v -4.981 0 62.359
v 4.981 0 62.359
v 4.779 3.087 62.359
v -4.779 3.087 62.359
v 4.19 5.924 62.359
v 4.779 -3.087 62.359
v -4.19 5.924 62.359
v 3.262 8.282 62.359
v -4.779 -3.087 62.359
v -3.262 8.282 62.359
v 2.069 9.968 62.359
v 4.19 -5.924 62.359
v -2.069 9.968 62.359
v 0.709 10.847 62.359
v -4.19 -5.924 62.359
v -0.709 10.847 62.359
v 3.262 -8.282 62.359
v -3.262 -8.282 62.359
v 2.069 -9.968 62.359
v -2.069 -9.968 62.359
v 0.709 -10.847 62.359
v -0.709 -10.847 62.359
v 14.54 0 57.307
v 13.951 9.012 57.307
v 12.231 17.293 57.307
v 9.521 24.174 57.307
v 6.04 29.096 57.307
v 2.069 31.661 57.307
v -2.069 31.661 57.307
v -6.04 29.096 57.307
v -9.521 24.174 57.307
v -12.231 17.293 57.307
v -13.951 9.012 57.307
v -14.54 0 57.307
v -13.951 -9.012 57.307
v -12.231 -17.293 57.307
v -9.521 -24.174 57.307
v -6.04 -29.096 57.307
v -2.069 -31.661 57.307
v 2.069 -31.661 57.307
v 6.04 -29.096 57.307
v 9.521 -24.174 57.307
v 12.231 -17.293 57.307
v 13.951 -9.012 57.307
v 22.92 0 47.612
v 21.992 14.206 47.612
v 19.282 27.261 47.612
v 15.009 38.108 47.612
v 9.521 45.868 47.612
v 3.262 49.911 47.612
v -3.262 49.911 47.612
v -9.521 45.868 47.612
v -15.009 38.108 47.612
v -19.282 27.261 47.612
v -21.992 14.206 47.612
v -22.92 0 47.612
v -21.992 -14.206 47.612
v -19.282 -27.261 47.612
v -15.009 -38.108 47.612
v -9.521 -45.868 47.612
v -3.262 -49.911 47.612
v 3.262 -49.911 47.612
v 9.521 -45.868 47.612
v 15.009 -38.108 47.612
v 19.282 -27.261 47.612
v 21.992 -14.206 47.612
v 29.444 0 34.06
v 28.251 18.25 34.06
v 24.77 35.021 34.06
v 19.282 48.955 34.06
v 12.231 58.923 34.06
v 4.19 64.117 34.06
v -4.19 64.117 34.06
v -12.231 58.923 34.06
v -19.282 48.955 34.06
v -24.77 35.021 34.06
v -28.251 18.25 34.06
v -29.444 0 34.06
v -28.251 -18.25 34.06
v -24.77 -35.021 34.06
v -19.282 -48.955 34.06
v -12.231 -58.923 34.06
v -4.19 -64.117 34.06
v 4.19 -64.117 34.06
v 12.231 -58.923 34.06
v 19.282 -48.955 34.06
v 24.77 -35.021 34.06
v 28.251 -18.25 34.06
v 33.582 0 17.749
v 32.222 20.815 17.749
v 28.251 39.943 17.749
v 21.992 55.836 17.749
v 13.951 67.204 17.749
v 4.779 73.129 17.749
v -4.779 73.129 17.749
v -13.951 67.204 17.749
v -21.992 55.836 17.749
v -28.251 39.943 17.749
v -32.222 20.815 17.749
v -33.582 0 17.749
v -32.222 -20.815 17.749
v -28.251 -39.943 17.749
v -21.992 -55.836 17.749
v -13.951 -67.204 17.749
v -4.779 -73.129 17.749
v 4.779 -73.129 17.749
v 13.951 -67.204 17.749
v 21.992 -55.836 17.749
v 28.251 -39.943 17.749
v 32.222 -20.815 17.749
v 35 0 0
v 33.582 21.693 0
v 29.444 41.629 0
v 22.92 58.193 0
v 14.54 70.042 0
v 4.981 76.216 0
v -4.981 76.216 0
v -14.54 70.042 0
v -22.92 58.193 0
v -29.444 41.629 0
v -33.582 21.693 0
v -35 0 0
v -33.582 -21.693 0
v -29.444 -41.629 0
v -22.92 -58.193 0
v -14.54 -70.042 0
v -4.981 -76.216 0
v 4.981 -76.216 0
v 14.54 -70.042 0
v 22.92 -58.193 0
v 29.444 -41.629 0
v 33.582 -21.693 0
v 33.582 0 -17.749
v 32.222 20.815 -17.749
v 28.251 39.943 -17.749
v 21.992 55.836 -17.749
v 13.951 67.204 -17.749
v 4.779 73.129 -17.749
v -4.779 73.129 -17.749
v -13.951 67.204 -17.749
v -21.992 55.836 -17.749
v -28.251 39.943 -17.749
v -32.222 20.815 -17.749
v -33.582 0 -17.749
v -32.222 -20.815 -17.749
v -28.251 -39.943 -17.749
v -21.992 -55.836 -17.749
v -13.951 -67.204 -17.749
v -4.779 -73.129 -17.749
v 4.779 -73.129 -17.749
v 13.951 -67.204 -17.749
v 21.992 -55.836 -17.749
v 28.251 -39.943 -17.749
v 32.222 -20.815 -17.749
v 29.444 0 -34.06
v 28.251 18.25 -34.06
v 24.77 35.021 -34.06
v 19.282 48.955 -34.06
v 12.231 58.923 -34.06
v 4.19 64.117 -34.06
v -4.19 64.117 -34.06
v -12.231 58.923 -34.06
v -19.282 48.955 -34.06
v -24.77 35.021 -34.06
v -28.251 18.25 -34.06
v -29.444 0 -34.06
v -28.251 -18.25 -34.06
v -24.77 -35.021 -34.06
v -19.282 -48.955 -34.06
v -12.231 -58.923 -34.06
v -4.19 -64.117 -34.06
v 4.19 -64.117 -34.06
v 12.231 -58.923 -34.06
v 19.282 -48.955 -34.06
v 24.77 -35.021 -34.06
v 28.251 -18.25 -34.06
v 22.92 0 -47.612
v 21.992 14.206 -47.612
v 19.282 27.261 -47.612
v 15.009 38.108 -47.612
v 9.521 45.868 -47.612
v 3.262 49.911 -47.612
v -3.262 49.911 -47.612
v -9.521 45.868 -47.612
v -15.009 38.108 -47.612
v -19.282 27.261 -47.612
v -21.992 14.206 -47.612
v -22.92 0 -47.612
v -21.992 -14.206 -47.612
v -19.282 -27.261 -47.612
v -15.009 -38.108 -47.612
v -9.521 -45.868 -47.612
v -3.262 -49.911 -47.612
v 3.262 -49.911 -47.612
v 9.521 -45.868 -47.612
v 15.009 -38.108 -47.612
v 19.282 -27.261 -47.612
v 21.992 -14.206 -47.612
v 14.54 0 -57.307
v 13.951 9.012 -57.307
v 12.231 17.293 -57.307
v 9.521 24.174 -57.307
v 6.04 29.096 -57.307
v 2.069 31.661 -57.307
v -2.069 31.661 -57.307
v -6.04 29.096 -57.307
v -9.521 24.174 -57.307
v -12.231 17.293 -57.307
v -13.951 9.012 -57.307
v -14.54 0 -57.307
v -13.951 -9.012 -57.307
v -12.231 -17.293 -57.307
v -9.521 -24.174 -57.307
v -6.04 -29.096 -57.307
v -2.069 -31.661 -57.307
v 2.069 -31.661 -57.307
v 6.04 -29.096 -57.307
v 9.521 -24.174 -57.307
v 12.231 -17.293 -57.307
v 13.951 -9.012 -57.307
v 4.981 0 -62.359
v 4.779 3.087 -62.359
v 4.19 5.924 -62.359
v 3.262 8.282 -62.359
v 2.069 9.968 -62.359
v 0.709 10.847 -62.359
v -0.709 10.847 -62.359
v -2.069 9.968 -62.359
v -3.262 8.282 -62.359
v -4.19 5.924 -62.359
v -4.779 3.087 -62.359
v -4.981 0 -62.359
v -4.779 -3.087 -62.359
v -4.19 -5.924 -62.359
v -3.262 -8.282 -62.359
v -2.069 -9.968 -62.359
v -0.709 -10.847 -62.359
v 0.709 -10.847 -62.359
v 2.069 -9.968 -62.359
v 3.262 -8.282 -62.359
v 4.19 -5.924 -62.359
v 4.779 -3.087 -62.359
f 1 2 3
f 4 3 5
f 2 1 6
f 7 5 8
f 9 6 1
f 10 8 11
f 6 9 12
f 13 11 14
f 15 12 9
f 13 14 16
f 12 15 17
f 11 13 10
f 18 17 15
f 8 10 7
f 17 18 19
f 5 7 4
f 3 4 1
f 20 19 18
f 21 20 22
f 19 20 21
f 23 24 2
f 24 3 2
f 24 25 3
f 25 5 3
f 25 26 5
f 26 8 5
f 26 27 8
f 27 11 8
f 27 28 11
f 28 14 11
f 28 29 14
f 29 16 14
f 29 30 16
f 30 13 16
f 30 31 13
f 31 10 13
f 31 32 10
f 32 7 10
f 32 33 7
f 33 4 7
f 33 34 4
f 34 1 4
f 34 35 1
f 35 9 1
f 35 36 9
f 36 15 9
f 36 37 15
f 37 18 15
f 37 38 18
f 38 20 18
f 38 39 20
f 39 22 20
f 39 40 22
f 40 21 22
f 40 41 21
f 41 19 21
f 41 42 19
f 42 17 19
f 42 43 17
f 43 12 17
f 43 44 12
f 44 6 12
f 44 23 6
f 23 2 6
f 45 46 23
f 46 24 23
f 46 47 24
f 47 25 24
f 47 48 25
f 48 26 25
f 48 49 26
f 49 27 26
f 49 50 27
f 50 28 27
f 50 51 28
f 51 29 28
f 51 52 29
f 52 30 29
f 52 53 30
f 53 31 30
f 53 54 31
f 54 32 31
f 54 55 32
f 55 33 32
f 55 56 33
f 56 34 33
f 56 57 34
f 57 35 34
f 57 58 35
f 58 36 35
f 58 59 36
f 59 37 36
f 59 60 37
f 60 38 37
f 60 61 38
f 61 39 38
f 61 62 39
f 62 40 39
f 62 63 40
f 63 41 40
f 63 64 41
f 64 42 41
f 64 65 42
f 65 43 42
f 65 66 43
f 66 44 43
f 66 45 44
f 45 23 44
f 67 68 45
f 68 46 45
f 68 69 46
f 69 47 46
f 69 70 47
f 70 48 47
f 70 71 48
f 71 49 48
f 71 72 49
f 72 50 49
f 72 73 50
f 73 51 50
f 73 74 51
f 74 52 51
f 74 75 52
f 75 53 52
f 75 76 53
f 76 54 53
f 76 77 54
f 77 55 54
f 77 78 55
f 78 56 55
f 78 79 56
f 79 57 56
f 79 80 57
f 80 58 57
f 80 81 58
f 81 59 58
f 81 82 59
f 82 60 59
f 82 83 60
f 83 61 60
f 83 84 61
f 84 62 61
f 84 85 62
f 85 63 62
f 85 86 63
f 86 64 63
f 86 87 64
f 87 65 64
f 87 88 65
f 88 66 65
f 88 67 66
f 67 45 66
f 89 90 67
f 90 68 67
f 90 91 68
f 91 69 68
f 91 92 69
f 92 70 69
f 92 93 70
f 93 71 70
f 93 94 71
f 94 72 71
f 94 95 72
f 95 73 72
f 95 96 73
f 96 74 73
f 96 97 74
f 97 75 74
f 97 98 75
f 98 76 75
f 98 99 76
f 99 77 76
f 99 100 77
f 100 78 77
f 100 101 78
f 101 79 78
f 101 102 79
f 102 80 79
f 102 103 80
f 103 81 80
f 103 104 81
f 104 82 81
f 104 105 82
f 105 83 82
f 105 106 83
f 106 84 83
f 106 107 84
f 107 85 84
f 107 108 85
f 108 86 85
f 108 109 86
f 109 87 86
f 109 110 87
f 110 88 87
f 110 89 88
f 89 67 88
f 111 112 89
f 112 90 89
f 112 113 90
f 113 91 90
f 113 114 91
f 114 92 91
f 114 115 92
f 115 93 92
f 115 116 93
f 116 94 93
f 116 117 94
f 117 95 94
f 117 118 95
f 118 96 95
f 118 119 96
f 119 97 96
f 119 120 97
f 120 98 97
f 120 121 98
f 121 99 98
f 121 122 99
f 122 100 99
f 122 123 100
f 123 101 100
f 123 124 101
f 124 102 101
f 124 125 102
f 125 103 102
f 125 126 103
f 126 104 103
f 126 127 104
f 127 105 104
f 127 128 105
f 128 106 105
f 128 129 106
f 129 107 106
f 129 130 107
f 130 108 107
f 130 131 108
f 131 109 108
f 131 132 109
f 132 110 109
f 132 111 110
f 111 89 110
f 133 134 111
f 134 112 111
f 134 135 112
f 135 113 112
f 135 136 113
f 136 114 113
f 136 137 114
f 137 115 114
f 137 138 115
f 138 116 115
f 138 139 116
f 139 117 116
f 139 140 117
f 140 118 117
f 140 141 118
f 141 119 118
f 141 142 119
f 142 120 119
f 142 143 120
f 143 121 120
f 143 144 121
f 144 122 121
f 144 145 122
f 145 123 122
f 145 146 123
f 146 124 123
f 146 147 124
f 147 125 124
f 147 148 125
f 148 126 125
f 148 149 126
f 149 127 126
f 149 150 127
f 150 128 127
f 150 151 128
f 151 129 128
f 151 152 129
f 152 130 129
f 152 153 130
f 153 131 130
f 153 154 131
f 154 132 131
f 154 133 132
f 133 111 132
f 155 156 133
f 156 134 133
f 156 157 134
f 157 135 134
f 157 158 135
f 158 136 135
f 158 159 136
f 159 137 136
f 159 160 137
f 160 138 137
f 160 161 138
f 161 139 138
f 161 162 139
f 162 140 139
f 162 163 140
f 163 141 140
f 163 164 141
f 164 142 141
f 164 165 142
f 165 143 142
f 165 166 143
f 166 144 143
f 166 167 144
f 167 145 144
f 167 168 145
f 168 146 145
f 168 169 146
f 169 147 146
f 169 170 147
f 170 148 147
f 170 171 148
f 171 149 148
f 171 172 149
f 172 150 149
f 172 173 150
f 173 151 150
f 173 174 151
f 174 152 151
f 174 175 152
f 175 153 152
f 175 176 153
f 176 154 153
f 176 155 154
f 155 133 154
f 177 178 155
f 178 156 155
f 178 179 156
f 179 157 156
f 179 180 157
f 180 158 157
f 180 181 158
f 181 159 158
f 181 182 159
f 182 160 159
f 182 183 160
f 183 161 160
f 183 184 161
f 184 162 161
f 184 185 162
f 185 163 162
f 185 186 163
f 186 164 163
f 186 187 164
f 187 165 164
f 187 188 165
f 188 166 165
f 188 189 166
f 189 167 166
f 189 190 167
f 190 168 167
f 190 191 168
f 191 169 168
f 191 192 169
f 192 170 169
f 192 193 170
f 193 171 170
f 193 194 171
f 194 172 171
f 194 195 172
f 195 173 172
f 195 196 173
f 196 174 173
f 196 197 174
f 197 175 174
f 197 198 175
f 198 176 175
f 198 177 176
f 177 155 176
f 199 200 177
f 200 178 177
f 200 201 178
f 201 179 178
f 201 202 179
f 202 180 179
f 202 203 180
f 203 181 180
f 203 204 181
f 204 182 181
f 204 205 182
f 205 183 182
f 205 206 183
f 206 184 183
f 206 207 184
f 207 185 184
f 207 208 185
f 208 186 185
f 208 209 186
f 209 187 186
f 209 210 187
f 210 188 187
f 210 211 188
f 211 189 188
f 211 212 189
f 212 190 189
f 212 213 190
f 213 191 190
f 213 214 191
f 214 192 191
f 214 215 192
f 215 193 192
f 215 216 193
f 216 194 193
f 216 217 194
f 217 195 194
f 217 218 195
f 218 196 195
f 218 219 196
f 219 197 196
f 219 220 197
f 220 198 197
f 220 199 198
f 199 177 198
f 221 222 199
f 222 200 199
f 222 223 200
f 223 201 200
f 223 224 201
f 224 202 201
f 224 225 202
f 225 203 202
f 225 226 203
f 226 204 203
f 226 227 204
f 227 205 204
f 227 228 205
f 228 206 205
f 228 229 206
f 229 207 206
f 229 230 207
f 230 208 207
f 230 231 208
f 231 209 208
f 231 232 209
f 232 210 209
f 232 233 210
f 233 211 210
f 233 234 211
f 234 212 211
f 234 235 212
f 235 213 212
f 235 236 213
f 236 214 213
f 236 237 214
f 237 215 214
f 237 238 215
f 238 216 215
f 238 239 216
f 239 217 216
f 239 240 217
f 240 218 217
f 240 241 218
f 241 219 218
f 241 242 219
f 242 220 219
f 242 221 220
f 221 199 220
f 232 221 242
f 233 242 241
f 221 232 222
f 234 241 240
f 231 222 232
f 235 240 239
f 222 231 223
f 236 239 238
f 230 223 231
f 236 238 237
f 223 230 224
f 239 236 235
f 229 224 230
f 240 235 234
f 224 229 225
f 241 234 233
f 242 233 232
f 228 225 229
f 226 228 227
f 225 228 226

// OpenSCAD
// Generated by SolidPython 1.0.1 on 2020-07-29 00:46:46


scale(v = [5, 11, 9]) {
	sphere(r = 7);
}
/***********************************************
*********      SolidPython code:      **********
************************************************
 
# import packages: SolidPython
from solid import *
from solid.utils import *
from itertools import chain, combinations, permutations


class Resize:

    def __init__(self, scad_file):
        self.scad_file = scad_file
        #self.scad_file = import_scad(scad_file)
        # cone/cylinder param:
        self.r1 = 0
        self.r2 = 0
        self.h = 0
        # rectangular prism param:
        self.w = 0
        self.l = 0
        # ellipse param:
        self.r = 0

    # import OpenScad code (file name corresponds to shape)


    # classify shape + parameters
    def assign(self, param1, param2, param3):
        if self.scad_file == 'cone.scad':
            self.r1 = param1
            self.r2 = param2
            self.h = param3
        elif self.scad_file == 'cylinder.scad':
            self.r1 = param1
            self.r2 = param2
            self.h = param3
        elif self.scad_file == 'rectangularPrism.scad':
            self.h = param1
            self.l = param2
            self.w = param3
        else:
            self.r = param1
            self.h = param2

    # resize parameters
    def iterate(self):
        x = range(3, 20, 2)
        i = 1
        if self.scad_file == 'cone.scad':
            tempList = list(permutations(x, 2))
            for temp in tempList:
                param1 = temp[0]
                param2 = temp[1]
                filepath = 'produced_scad_files/' + 'cone' + str(param1) + '_' + str(param2) + '_' + '.scad'
                scad_render_to_file(cylinder(h=param1, r1=param2, r2=0), filepath)

        elif self.scad_file == 'cylinder.scad':
            tempList = list(permutations(x, 3))
            for temp in tempList:
                param1 = temp[0]
                param2 = temp[1]
                filepath = 'produced_scad_files/' + 'cylinder' + str(param1) + '_' + str(param2) + '_' + '.scad'
                scad_render_to_file(cylinder(h=param1, r1=param2, r2=param2), filepath)

        elif self.scad_file == 'rectangularPrism.scad':
            tempList = list(permutations(x, 3))
            for temp in tempList:
                param1 = temp[0]
                param2 = temp[1]
                param3 = temp[2]
                filepath = 'produced_scad_files/' + 'rectangularPrism' + str(param1) + '_' + str(param2) + '_' + str(
                    param3) + '.scad'
                scad_render_to_file(cube(size=(param1, param2, param3)), filepath)

        elif self.scad_file == 'ellipse.scad':
            tempList = list(permutations(x, 4))
            for temp in tempList:
                param1 = temp[0]
                param2 = temp[1]
                param3 = temp[2]
                param4 = temp[3]
                filepath = 'produced_scad_files/' + 'ellipse' + str(param1) + '_' + str(param2) + '_' + str(param3) + '_' + str(param4) + '.scad'
                scad_render_to_file(scale([param1, param2, param3])(sphere(r=param4)), filepath)

    def render_to_scadfile(self):
        scad_render_to_file(scad, 'example.scad') 
 
************************************************/
